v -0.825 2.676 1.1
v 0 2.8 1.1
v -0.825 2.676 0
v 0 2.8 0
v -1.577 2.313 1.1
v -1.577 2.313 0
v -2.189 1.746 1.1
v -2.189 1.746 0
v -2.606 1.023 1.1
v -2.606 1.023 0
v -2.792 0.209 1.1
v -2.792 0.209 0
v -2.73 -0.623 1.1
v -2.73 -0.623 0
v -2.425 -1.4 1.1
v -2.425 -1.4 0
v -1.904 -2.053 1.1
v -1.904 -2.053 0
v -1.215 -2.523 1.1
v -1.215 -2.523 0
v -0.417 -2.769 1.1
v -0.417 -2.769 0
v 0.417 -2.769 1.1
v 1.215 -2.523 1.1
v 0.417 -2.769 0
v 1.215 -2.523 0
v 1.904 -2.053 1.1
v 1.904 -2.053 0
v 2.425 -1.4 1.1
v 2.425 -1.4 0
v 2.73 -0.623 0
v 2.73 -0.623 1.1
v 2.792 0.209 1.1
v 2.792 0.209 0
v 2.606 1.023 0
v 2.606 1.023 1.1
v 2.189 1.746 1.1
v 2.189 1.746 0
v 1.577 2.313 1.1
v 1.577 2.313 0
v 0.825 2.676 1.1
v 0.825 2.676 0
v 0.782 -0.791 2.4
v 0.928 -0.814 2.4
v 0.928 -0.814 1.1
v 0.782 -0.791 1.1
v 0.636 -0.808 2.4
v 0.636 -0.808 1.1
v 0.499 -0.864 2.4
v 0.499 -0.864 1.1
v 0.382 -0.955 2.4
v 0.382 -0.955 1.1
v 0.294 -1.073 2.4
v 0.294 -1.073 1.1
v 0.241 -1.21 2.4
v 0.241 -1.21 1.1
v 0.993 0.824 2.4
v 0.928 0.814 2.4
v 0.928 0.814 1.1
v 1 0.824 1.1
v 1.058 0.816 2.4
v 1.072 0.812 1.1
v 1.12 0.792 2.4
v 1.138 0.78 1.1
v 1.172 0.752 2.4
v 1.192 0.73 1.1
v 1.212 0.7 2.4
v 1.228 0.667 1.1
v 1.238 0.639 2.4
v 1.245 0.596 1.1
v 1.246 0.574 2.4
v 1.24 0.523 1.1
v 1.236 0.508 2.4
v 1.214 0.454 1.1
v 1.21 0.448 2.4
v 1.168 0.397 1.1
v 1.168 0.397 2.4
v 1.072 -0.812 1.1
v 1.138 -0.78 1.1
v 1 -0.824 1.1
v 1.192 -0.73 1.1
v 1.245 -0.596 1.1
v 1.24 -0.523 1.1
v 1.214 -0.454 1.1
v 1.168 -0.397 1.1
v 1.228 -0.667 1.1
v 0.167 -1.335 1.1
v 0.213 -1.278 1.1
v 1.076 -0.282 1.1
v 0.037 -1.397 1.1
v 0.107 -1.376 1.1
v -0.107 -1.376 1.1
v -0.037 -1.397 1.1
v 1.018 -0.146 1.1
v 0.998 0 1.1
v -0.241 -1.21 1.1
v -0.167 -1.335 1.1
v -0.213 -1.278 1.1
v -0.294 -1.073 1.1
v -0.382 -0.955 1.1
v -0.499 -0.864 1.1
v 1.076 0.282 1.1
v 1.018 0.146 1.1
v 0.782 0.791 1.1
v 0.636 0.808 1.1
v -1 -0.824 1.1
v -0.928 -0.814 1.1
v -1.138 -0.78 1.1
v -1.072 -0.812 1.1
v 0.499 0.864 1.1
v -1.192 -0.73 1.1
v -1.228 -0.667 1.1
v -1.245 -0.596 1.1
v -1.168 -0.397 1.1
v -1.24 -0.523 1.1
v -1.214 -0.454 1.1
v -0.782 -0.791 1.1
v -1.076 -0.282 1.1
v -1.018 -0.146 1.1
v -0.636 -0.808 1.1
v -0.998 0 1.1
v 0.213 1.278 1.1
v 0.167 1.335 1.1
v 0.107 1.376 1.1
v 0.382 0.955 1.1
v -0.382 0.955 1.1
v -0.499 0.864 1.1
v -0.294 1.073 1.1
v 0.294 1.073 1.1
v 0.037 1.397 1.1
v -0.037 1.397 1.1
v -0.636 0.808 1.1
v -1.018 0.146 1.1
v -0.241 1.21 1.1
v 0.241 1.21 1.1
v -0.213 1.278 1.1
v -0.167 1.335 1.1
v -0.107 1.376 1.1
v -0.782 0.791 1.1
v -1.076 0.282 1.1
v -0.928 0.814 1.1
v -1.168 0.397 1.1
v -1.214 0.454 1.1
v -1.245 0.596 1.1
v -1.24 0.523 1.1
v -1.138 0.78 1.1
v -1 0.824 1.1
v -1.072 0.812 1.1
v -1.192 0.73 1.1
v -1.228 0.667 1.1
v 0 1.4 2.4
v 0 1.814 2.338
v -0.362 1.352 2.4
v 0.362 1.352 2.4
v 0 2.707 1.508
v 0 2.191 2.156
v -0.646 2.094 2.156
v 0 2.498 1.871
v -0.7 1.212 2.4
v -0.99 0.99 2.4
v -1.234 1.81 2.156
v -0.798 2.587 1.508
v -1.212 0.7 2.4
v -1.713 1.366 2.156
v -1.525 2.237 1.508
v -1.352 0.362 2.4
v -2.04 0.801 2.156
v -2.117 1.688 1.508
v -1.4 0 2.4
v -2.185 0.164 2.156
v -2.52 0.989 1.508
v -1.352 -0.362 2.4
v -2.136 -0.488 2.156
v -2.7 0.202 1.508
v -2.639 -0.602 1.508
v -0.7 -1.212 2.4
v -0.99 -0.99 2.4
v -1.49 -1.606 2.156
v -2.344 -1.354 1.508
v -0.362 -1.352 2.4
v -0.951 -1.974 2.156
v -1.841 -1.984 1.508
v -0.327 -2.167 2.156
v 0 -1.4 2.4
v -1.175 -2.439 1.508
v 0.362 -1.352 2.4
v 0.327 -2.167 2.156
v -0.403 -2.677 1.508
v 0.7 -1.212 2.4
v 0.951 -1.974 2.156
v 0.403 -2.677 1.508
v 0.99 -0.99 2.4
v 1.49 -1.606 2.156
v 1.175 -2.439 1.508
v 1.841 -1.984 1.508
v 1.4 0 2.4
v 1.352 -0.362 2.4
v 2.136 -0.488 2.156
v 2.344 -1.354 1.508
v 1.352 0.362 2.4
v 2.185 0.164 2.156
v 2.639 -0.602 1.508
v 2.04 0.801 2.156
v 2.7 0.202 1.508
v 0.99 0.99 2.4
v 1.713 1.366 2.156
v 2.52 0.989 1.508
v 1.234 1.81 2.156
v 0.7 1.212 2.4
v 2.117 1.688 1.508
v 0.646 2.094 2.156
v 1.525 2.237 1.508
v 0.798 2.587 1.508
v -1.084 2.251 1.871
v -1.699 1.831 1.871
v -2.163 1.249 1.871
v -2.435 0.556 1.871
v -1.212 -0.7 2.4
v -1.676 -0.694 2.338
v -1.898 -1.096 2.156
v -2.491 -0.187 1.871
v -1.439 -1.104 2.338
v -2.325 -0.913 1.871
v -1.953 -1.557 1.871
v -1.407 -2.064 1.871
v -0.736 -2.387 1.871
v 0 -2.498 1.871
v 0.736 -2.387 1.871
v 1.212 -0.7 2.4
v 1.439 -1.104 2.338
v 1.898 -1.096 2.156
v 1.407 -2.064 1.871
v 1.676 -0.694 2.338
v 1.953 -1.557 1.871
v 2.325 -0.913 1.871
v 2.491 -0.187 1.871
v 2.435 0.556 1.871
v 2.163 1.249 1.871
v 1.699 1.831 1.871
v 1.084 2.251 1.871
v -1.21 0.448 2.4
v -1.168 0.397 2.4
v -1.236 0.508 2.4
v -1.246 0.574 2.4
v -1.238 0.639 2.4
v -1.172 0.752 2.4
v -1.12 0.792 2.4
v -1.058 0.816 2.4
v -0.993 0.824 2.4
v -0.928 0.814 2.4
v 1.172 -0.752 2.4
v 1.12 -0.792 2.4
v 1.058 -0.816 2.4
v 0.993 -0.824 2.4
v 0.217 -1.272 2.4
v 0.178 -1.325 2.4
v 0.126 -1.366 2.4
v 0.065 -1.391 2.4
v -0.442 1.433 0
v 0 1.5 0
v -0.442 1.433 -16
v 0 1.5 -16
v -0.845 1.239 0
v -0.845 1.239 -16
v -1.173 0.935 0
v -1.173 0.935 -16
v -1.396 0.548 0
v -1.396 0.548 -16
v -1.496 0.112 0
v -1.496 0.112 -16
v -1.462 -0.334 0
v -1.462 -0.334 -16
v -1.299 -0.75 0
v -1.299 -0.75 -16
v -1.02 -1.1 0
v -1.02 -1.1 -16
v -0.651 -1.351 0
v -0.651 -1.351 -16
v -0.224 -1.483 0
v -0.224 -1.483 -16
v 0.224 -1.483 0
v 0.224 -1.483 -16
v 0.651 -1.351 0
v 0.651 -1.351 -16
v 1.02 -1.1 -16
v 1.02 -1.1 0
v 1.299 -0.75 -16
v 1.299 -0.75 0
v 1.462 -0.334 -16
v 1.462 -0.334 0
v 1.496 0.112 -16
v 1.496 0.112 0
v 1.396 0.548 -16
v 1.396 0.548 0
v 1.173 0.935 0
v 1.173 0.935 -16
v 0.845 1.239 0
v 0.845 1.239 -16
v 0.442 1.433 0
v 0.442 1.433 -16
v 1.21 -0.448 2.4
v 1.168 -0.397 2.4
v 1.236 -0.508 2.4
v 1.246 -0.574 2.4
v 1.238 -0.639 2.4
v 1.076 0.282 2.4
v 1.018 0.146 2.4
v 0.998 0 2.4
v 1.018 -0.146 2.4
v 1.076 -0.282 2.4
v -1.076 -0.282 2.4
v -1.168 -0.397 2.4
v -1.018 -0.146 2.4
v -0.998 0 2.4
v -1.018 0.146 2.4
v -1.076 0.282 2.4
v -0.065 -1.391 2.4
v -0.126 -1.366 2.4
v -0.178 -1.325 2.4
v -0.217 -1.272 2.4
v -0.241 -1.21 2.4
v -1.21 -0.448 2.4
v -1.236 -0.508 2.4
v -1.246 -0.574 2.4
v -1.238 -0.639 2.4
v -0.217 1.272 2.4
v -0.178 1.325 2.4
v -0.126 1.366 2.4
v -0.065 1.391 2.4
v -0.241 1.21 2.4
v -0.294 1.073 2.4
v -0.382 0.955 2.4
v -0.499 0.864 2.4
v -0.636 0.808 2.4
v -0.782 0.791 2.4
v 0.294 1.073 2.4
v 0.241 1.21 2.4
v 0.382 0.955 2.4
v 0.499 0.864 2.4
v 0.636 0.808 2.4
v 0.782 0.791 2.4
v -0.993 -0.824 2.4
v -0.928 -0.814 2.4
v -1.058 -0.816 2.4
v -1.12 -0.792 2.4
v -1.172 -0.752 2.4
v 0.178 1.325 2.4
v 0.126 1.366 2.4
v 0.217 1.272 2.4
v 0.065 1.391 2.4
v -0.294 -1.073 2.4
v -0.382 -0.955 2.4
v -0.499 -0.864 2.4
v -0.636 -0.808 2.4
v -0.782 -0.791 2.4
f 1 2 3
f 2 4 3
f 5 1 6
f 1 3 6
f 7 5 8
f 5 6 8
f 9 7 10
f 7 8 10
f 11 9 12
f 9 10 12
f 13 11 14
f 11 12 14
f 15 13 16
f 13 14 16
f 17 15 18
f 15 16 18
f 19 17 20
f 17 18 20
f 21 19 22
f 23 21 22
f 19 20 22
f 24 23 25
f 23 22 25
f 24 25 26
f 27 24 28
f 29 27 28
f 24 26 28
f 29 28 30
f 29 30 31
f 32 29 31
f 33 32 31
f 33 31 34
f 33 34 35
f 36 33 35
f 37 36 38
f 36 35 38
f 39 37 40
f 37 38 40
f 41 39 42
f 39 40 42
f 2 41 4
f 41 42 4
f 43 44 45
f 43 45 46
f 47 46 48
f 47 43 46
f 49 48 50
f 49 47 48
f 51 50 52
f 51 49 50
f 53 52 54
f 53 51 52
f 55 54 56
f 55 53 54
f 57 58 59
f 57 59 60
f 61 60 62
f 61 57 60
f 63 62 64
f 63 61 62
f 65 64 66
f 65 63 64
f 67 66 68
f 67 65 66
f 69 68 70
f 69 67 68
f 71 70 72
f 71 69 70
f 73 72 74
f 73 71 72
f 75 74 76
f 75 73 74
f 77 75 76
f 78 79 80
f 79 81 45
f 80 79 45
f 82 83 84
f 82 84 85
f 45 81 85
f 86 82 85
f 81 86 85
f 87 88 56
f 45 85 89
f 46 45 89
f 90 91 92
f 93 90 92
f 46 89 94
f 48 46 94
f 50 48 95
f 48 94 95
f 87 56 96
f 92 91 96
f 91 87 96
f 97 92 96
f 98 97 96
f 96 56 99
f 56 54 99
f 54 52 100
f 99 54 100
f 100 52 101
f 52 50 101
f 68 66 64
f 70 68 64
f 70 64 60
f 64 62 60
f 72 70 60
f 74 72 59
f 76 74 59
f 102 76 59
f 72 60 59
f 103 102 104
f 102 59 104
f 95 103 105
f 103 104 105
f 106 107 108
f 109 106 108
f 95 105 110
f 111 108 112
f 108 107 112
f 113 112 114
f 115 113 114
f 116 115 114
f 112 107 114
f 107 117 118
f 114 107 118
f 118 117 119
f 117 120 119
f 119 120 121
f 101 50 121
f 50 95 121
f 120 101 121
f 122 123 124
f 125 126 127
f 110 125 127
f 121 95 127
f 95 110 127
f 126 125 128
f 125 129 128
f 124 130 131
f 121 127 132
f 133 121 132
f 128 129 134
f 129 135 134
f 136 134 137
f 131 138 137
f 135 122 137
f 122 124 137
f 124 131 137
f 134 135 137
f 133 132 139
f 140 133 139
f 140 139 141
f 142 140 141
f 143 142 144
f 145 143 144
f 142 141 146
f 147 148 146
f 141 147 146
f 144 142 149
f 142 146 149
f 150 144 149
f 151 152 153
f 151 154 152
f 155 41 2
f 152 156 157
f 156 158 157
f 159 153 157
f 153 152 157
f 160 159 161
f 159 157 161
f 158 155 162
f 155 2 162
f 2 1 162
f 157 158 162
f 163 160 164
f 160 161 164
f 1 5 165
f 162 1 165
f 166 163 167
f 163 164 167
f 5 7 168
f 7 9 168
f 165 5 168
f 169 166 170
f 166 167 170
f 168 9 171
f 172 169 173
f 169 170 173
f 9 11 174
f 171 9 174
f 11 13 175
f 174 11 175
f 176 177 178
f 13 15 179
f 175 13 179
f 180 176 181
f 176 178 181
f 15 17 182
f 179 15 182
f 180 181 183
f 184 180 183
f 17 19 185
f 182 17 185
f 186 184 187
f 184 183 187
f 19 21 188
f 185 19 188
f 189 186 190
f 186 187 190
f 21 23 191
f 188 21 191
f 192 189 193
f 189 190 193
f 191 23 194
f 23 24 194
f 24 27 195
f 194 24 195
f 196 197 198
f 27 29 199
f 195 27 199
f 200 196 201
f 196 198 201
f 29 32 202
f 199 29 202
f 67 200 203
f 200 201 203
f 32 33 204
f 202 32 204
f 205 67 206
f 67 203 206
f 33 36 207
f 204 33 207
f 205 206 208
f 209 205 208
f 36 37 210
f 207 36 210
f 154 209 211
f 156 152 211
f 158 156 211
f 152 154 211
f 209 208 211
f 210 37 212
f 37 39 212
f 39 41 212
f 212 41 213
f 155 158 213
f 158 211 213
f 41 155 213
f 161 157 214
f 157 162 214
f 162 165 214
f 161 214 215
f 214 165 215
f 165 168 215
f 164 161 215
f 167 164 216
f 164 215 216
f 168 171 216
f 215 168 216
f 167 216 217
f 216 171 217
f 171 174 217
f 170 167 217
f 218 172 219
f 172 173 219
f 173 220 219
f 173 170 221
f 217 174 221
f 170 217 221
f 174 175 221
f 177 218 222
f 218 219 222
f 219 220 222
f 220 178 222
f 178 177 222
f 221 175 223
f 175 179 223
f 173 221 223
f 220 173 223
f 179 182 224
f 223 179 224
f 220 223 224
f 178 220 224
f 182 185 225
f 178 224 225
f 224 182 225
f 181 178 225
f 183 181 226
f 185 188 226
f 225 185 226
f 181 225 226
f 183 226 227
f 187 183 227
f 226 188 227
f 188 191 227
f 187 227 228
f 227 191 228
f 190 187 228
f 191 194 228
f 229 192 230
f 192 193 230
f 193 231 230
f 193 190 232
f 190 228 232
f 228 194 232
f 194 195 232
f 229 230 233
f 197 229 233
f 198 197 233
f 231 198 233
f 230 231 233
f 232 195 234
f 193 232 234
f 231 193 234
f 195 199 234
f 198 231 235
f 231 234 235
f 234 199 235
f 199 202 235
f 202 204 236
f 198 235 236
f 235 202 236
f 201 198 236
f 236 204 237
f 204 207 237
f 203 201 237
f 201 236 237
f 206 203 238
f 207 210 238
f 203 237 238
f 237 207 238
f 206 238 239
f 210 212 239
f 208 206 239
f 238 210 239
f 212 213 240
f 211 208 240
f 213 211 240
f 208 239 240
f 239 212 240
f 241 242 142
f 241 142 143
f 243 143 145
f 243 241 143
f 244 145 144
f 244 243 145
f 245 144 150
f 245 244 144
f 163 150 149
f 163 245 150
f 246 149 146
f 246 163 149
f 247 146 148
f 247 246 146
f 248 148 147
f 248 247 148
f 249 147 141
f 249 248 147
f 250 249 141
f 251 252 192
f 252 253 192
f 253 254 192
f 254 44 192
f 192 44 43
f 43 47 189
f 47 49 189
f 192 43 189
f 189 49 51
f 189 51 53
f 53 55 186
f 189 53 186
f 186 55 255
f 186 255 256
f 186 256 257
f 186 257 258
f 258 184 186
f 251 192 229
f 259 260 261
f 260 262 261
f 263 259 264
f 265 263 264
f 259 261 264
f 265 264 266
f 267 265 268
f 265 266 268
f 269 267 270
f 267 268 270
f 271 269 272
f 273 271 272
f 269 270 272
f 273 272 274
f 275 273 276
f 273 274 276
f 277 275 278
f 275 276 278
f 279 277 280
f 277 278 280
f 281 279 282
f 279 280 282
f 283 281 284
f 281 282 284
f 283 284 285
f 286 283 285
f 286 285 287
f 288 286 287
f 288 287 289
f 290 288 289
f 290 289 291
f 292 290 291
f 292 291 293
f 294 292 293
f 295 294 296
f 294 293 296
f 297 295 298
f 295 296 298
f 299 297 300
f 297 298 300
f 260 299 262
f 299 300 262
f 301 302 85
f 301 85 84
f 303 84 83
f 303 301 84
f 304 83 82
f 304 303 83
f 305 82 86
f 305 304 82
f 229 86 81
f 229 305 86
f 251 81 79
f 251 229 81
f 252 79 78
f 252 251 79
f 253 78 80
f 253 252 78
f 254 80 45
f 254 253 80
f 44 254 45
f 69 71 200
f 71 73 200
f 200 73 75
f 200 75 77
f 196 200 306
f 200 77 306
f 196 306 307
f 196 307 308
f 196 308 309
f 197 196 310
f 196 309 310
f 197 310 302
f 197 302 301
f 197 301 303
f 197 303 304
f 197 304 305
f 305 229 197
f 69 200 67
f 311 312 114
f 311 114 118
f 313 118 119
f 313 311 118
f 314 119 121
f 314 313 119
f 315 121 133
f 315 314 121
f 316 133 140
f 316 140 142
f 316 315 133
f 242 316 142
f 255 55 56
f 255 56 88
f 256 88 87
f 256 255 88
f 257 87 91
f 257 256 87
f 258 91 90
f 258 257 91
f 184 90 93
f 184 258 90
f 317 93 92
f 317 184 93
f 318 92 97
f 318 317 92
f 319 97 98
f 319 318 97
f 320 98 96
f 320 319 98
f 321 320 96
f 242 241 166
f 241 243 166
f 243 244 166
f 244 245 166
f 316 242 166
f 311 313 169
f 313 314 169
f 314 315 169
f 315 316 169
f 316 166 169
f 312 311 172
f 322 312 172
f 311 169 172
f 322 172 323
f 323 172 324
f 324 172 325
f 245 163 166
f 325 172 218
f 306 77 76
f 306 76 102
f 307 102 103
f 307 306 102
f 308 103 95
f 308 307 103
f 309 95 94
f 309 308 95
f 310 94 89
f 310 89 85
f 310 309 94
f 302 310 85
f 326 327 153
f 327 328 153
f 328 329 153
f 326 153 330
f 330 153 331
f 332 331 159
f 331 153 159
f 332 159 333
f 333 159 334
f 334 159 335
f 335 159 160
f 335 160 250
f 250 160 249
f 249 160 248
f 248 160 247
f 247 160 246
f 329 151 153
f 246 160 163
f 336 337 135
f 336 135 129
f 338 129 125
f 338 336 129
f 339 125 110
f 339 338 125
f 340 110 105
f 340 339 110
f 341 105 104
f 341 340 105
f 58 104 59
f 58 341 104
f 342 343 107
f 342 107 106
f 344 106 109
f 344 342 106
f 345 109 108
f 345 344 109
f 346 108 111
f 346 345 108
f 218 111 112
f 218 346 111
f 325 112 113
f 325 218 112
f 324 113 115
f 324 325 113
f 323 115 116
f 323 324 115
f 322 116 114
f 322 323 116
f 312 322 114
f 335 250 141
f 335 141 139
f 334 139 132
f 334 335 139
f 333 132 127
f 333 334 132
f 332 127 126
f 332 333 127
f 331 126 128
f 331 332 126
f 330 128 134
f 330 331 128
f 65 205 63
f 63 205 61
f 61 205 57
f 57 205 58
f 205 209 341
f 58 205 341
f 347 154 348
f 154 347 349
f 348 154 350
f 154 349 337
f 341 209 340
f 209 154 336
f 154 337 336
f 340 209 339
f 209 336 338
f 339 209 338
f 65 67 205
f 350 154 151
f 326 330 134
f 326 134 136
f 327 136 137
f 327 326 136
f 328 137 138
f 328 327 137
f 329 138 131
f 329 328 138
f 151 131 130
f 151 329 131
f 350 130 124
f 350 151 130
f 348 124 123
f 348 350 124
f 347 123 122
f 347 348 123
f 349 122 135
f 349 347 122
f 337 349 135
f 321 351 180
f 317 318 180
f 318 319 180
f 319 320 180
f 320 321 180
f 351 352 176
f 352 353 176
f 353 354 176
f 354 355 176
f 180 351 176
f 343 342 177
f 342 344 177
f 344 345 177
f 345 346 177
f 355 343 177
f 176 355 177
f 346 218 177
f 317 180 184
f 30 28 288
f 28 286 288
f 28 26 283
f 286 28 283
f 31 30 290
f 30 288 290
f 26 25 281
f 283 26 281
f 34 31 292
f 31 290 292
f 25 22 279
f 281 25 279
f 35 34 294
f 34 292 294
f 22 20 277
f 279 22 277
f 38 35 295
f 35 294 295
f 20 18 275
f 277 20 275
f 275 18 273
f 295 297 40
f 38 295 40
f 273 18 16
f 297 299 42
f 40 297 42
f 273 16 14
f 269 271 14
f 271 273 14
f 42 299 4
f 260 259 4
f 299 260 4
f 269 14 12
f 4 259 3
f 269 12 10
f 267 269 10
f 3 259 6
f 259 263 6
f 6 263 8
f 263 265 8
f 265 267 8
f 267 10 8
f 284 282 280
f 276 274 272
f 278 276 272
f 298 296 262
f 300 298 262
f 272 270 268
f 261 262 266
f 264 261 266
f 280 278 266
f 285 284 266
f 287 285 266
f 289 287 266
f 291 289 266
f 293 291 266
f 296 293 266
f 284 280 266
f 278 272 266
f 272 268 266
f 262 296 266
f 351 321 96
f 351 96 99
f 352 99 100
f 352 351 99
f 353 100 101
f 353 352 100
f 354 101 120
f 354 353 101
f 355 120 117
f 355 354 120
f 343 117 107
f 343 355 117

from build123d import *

# Parameters (mm, degrees)
ENL_V_MAT_EXTRU_1_DEPTH = 1.3


with BuildPart() as part:
    # Esquisse1 → Révolution1 (revolve)
    with BuildSketch(Plane(origin=(0, 0, 0), x_dir=(0, 0, -1), z_dir=(1, 0, 0))):
        with BuildLine():
            Line((-2.4, 0), (-2.4, 1.4))
            ThreePointArc((-2.4, 1.4), (-2.024883171, 2.355248659), (-1.1, 2.8))
            Line((-1.1, 2.8), (0, 2.8))
            Line((0, 2.8), (0, 1.5))
            Line((0, 1.5), (16, 1.5))
            Line((16, 1.5), (16, 0))
            Line((16, 0), (-2.4, 0))
        make_face()
    revolve(axis=Axis((0, 0, 2.4), (0, 0, 1)))

    # Esquisse2 → Enlèv. mat.-Extru.1 (cut)
    with BuildSketch(Plane.XY.offset(2.4)):
        with BuildLine():
            ThreePointArc((-0.240728142, 1.210222096), (0, 1.4), (0.240728142, 1.210222096))
            ThreePointArc((0.240728142, 1.210222096), (0.499017901, 0.864324358), (0.927719008, 0.813587734))
            ThreePointArc((0.927719008, 0.813587734), (1.212435565, 0.7), (1.16844715, 0.396634361))
            ThreePointArc((1.16844715, 0.396634361), (0.998035801, 0), (1.16844715, -0.396634361))
            ThreePointArc((1.16844715, -0.396634361), (1.212435565, -0.7), (0.927719008, -0.813587734))
            ThreePointArc((0.927719008, -0.813587734), (0.499017901, -0.864324358), (0.240728142, -1.210222096))
            ThreePointArc((0.240728142, -1.210222096), (0, -1.4), (-0.240728142, -1.210222096))
            ThreePointArc((-0.240728142, -1.210222096), (-0.499017901, -0.864324358), (-0.927719008, -0.813587734))
            ThreePointArc((-0.927719008, -0.813587734), (-1.212435565, -0.7), (-1.16844715, -0.396634361))
            ThreePointArc((-1.16844715, -0.396634361), (-0.998035801, 0), (-1.16844715, 0.396634361))
            ThreePointArc((-1.16844715, 0.396634361), (-1.212435565, 0.7), (-0.927719008, 0.813587734))
            ThreePointArc((-0.927719008, 0.813587734), (-0.499017901, 0.864324358), (-0.240728142, 1.210222096))
        make_face()
    extrude(amount=-ENL_V_MAT_EXTRU_1_DEPTH, mode=Mode.SUBTRACT)


solid = part.part
